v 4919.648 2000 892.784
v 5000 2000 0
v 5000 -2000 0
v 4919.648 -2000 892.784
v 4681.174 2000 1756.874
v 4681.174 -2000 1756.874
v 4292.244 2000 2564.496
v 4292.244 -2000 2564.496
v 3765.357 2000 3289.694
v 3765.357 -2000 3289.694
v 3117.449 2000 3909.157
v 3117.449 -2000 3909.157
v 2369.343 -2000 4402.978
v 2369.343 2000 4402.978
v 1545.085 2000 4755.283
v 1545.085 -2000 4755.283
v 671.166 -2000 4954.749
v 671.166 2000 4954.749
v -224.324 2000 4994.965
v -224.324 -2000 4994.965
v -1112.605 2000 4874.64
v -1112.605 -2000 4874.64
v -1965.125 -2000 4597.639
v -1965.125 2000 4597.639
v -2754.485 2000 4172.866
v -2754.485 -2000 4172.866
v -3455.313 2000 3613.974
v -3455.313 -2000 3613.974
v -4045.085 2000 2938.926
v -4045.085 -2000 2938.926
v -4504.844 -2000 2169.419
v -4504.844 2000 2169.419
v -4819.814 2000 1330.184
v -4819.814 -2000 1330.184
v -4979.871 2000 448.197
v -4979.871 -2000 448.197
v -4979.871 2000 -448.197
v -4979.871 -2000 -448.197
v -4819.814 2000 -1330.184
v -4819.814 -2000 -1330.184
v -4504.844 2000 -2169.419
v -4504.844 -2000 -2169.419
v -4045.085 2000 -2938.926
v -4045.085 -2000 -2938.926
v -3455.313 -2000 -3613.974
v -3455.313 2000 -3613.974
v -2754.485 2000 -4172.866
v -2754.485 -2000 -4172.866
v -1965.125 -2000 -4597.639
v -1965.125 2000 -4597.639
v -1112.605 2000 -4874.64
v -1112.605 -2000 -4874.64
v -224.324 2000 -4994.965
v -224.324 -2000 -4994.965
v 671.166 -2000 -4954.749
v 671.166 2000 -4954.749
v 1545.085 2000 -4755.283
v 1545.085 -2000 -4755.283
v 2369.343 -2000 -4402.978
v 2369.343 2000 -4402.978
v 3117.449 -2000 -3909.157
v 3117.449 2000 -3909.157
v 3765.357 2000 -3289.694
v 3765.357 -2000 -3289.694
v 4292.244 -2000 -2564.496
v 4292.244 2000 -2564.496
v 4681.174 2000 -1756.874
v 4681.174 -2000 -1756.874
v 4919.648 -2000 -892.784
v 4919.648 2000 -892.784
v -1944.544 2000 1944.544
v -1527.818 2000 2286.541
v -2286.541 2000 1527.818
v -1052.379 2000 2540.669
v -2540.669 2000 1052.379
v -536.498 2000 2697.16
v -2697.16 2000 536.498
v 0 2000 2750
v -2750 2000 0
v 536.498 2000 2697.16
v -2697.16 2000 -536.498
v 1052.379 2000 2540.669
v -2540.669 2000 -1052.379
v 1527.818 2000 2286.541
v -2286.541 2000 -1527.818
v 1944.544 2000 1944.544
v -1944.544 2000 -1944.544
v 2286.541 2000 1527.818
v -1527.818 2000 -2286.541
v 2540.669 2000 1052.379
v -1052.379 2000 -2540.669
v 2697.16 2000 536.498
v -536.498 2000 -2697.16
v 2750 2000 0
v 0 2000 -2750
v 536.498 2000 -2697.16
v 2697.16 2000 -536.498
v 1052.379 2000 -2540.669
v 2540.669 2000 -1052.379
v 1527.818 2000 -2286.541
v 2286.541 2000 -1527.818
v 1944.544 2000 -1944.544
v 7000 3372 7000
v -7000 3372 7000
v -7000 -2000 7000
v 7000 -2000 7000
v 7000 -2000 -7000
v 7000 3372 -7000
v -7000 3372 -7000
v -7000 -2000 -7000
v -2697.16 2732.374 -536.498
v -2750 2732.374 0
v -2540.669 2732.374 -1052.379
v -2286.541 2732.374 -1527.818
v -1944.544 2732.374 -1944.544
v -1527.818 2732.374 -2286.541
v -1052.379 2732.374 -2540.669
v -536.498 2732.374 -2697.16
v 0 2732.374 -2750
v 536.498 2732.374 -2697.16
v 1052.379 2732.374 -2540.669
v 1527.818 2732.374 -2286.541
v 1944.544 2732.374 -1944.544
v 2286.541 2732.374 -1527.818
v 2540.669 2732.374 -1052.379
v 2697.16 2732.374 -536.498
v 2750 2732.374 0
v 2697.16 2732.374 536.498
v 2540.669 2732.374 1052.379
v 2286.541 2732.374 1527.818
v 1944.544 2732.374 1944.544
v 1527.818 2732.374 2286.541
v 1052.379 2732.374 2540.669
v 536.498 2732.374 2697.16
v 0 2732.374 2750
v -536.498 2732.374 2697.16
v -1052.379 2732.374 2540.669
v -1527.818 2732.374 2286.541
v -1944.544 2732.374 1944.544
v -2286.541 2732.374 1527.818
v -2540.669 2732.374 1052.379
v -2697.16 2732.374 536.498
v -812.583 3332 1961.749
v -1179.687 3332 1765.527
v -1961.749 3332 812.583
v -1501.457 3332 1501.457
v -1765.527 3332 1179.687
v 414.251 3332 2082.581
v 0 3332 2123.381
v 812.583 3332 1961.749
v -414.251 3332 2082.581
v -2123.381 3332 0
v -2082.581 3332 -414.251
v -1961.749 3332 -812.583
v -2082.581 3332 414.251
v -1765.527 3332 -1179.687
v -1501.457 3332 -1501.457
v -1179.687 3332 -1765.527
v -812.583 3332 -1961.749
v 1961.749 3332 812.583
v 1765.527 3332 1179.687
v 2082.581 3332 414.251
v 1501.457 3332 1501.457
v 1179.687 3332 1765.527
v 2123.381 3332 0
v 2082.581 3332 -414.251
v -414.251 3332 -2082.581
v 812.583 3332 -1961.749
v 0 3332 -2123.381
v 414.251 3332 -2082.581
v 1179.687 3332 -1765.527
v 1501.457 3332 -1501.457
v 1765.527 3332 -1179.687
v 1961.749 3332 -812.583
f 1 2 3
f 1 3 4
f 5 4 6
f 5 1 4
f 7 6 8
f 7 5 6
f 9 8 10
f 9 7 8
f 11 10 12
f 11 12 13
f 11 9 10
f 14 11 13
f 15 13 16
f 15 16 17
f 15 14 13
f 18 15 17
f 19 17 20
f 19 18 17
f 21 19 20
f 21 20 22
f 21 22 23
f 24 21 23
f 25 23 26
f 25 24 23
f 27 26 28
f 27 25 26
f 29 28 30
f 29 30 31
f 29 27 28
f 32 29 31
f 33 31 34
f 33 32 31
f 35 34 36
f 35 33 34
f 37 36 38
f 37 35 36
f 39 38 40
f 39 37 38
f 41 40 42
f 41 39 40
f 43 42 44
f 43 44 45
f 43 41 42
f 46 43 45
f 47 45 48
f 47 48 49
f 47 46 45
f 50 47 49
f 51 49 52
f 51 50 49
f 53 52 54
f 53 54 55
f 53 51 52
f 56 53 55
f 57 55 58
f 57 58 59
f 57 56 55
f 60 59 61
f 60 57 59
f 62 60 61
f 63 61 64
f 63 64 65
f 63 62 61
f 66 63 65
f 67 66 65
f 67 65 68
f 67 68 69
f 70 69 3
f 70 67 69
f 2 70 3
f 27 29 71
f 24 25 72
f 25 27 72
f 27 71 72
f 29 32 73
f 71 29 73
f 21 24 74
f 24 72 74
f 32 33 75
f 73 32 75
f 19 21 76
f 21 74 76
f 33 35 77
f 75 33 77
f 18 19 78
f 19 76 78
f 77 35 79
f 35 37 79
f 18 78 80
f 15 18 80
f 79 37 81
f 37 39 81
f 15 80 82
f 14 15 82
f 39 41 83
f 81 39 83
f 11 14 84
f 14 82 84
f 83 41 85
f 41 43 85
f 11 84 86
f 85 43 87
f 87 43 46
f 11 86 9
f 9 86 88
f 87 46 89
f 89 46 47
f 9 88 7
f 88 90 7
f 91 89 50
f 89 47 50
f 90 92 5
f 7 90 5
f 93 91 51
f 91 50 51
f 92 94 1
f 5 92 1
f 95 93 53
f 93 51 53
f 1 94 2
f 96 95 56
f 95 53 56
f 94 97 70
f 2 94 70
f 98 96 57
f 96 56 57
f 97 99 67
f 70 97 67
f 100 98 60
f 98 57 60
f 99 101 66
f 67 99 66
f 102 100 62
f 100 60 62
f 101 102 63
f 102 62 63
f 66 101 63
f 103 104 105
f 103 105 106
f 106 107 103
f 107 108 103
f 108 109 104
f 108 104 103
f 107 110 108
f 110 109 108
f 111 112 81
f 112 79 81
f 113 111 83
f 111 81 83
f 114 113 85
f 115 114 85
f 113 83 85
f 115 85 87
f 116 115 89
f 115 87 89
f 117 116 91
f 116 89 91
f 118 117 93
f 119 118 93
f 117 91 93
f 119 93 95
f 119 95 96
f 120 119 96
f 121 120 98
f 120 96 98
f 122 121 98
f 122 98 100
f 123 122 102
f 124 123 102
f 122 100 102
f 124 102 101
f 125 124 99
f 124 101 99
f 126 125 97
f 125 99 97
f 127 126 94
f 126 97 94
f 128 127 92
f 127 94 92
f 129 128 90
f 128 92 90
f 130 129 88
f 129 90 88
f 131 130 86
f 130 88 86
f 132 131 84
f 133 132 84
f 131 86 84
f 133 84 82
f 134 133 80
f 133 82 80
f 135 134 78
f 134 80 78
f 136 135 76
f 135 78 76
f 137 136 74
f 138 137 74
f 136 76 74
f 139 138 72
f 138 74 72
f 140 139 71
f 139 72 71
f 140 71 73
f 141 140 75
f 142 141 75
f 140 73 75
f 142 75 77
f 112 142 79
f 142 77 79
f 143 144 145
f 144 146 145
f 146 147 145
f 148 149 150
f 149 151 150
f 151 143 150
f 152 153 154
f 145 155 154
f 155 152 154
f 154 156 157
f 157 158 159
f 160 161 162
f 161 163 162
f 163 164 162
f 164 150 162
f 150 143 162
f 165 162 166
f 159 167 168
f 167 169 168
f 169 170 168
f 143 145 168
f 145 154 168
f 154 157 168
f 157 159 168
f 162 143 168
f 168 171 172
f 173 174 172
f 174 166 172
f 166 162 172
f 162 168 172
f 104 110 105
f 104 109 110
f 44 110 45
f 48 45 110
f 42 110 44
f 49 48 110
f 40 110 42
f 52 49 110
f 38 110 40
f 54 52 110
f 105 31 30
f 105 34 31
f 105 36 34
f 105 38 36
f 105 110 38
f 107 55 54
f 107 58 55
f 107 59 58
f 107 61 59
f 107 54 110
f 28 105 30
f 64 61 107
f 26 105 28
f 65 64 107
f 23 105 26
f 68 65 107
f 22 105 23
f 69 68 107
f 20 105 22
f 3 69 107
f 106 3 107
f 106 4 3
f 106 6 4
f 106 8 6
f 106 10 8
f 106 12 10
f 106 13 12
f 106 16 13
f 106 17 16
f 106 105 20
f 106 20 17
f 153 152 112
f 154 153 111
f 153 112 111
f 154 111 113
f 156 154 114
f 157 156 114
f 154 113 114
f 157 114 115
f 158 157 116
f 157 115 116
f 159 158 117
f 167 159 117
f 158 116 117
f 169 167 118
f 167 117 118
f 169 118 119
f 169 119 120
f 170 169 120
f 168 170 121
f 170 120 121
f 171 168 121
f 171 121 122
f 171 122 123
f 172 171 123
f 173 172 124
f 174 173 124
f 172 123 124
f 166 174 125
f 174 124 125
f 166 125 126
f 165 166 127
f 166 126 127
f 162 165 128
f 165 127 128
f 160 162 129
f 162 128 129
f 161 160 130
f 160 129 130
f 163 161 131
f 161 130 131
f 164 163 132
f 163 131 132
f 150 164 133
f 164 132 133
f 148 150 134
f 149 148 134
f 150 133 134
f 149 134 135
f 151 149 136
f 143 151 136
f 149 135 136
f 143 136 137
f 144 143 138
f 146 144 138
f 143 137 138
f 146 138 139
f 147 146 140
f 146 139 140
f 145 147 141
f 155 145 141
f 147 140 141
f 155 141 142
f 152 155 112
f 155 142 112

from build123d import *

# Parameters (mm, degrees)
BOSS_EXTRUDE1_DEPTH = 1372
SKETCH4_W           = 14000
SKETCH4_H           = 14000
SKETCH4_R           = 5000
BOSS_EXTRUDE2_DEPTH = 4000


with BuildPart() as part:
    # Sketch2 → Revolve2 (revolve)
    with BuildSketch(Plane.XY):
        Polygon((-2750, 2000), (-7000, 2000), (-7000, 3372), (0, 3372), (0, 3332), (-2123.381318695, 3332), (-2750, 2732.374065947), align=None)
    revolve(axis=Axis((0, 3520.44, 0), (0, -1, 0)))

    # Sketch3 → Boss-Extrude1 (add)
    with BuildSketch(Plane(origin=(0, 3372, 0), x_dir=(1, 0, 0), z_dir=(0, 1, 0))):
        with BuildLine():
            ThreePointArc((7.996e-06, -7000), (-4949.747456115, -4949.747480497), (-7000, -2.6486e-05))
            Line((-7000, -2.6486e-05), (-7000, -7000))
            Line((-7000, -7000), (7.996e-06, -7000))
        make_face()
        with BuildLine():
            Line((-2.0497e-05, 7000), (-7000, 7000))
            Line((-7000, 7000), (-7000, -2.6486e-05))
            ThreePointArc((-7000, -2.6486e-05), (-4949.747484916, 4949.747451695), (-2.0497e-05, 7000))
        make_face()
        with BuildLine():
            Line((7000, 7000), (-2.0497e-05, 7000))
            ThreePointArc((-2.0497e-05, 7000), (4949.747461059, 4949.747475552), (7000, 0))
            Line((7000, 0), (7000, 7000))
        make_face()
        with BuildLine():
            Line((7000, -7000), (7000, 0))
            ThreePointArc((7000, 0), (4949.747471133, -4949.747465479), (7.996e-06, -7000))
            Line((7.996e-06, -7000), (7000, -7000))
        make_face()
    extrude(amount=-BOSS_EXTRUDE1_DEPTH)

    # Sketch4 → Boss-Extrude2 (add)
    with BuildSketch(Plane.XZ.offset(-2000)):
        Rectangle(SKETCH4_W, SKETCH4_H)
        Circle(SKETCH4_R, mode=Mode.SUBTRACT)
    extrude(amount=BOSS_EXTRUDE2_DEPTH)


solid = part.part
